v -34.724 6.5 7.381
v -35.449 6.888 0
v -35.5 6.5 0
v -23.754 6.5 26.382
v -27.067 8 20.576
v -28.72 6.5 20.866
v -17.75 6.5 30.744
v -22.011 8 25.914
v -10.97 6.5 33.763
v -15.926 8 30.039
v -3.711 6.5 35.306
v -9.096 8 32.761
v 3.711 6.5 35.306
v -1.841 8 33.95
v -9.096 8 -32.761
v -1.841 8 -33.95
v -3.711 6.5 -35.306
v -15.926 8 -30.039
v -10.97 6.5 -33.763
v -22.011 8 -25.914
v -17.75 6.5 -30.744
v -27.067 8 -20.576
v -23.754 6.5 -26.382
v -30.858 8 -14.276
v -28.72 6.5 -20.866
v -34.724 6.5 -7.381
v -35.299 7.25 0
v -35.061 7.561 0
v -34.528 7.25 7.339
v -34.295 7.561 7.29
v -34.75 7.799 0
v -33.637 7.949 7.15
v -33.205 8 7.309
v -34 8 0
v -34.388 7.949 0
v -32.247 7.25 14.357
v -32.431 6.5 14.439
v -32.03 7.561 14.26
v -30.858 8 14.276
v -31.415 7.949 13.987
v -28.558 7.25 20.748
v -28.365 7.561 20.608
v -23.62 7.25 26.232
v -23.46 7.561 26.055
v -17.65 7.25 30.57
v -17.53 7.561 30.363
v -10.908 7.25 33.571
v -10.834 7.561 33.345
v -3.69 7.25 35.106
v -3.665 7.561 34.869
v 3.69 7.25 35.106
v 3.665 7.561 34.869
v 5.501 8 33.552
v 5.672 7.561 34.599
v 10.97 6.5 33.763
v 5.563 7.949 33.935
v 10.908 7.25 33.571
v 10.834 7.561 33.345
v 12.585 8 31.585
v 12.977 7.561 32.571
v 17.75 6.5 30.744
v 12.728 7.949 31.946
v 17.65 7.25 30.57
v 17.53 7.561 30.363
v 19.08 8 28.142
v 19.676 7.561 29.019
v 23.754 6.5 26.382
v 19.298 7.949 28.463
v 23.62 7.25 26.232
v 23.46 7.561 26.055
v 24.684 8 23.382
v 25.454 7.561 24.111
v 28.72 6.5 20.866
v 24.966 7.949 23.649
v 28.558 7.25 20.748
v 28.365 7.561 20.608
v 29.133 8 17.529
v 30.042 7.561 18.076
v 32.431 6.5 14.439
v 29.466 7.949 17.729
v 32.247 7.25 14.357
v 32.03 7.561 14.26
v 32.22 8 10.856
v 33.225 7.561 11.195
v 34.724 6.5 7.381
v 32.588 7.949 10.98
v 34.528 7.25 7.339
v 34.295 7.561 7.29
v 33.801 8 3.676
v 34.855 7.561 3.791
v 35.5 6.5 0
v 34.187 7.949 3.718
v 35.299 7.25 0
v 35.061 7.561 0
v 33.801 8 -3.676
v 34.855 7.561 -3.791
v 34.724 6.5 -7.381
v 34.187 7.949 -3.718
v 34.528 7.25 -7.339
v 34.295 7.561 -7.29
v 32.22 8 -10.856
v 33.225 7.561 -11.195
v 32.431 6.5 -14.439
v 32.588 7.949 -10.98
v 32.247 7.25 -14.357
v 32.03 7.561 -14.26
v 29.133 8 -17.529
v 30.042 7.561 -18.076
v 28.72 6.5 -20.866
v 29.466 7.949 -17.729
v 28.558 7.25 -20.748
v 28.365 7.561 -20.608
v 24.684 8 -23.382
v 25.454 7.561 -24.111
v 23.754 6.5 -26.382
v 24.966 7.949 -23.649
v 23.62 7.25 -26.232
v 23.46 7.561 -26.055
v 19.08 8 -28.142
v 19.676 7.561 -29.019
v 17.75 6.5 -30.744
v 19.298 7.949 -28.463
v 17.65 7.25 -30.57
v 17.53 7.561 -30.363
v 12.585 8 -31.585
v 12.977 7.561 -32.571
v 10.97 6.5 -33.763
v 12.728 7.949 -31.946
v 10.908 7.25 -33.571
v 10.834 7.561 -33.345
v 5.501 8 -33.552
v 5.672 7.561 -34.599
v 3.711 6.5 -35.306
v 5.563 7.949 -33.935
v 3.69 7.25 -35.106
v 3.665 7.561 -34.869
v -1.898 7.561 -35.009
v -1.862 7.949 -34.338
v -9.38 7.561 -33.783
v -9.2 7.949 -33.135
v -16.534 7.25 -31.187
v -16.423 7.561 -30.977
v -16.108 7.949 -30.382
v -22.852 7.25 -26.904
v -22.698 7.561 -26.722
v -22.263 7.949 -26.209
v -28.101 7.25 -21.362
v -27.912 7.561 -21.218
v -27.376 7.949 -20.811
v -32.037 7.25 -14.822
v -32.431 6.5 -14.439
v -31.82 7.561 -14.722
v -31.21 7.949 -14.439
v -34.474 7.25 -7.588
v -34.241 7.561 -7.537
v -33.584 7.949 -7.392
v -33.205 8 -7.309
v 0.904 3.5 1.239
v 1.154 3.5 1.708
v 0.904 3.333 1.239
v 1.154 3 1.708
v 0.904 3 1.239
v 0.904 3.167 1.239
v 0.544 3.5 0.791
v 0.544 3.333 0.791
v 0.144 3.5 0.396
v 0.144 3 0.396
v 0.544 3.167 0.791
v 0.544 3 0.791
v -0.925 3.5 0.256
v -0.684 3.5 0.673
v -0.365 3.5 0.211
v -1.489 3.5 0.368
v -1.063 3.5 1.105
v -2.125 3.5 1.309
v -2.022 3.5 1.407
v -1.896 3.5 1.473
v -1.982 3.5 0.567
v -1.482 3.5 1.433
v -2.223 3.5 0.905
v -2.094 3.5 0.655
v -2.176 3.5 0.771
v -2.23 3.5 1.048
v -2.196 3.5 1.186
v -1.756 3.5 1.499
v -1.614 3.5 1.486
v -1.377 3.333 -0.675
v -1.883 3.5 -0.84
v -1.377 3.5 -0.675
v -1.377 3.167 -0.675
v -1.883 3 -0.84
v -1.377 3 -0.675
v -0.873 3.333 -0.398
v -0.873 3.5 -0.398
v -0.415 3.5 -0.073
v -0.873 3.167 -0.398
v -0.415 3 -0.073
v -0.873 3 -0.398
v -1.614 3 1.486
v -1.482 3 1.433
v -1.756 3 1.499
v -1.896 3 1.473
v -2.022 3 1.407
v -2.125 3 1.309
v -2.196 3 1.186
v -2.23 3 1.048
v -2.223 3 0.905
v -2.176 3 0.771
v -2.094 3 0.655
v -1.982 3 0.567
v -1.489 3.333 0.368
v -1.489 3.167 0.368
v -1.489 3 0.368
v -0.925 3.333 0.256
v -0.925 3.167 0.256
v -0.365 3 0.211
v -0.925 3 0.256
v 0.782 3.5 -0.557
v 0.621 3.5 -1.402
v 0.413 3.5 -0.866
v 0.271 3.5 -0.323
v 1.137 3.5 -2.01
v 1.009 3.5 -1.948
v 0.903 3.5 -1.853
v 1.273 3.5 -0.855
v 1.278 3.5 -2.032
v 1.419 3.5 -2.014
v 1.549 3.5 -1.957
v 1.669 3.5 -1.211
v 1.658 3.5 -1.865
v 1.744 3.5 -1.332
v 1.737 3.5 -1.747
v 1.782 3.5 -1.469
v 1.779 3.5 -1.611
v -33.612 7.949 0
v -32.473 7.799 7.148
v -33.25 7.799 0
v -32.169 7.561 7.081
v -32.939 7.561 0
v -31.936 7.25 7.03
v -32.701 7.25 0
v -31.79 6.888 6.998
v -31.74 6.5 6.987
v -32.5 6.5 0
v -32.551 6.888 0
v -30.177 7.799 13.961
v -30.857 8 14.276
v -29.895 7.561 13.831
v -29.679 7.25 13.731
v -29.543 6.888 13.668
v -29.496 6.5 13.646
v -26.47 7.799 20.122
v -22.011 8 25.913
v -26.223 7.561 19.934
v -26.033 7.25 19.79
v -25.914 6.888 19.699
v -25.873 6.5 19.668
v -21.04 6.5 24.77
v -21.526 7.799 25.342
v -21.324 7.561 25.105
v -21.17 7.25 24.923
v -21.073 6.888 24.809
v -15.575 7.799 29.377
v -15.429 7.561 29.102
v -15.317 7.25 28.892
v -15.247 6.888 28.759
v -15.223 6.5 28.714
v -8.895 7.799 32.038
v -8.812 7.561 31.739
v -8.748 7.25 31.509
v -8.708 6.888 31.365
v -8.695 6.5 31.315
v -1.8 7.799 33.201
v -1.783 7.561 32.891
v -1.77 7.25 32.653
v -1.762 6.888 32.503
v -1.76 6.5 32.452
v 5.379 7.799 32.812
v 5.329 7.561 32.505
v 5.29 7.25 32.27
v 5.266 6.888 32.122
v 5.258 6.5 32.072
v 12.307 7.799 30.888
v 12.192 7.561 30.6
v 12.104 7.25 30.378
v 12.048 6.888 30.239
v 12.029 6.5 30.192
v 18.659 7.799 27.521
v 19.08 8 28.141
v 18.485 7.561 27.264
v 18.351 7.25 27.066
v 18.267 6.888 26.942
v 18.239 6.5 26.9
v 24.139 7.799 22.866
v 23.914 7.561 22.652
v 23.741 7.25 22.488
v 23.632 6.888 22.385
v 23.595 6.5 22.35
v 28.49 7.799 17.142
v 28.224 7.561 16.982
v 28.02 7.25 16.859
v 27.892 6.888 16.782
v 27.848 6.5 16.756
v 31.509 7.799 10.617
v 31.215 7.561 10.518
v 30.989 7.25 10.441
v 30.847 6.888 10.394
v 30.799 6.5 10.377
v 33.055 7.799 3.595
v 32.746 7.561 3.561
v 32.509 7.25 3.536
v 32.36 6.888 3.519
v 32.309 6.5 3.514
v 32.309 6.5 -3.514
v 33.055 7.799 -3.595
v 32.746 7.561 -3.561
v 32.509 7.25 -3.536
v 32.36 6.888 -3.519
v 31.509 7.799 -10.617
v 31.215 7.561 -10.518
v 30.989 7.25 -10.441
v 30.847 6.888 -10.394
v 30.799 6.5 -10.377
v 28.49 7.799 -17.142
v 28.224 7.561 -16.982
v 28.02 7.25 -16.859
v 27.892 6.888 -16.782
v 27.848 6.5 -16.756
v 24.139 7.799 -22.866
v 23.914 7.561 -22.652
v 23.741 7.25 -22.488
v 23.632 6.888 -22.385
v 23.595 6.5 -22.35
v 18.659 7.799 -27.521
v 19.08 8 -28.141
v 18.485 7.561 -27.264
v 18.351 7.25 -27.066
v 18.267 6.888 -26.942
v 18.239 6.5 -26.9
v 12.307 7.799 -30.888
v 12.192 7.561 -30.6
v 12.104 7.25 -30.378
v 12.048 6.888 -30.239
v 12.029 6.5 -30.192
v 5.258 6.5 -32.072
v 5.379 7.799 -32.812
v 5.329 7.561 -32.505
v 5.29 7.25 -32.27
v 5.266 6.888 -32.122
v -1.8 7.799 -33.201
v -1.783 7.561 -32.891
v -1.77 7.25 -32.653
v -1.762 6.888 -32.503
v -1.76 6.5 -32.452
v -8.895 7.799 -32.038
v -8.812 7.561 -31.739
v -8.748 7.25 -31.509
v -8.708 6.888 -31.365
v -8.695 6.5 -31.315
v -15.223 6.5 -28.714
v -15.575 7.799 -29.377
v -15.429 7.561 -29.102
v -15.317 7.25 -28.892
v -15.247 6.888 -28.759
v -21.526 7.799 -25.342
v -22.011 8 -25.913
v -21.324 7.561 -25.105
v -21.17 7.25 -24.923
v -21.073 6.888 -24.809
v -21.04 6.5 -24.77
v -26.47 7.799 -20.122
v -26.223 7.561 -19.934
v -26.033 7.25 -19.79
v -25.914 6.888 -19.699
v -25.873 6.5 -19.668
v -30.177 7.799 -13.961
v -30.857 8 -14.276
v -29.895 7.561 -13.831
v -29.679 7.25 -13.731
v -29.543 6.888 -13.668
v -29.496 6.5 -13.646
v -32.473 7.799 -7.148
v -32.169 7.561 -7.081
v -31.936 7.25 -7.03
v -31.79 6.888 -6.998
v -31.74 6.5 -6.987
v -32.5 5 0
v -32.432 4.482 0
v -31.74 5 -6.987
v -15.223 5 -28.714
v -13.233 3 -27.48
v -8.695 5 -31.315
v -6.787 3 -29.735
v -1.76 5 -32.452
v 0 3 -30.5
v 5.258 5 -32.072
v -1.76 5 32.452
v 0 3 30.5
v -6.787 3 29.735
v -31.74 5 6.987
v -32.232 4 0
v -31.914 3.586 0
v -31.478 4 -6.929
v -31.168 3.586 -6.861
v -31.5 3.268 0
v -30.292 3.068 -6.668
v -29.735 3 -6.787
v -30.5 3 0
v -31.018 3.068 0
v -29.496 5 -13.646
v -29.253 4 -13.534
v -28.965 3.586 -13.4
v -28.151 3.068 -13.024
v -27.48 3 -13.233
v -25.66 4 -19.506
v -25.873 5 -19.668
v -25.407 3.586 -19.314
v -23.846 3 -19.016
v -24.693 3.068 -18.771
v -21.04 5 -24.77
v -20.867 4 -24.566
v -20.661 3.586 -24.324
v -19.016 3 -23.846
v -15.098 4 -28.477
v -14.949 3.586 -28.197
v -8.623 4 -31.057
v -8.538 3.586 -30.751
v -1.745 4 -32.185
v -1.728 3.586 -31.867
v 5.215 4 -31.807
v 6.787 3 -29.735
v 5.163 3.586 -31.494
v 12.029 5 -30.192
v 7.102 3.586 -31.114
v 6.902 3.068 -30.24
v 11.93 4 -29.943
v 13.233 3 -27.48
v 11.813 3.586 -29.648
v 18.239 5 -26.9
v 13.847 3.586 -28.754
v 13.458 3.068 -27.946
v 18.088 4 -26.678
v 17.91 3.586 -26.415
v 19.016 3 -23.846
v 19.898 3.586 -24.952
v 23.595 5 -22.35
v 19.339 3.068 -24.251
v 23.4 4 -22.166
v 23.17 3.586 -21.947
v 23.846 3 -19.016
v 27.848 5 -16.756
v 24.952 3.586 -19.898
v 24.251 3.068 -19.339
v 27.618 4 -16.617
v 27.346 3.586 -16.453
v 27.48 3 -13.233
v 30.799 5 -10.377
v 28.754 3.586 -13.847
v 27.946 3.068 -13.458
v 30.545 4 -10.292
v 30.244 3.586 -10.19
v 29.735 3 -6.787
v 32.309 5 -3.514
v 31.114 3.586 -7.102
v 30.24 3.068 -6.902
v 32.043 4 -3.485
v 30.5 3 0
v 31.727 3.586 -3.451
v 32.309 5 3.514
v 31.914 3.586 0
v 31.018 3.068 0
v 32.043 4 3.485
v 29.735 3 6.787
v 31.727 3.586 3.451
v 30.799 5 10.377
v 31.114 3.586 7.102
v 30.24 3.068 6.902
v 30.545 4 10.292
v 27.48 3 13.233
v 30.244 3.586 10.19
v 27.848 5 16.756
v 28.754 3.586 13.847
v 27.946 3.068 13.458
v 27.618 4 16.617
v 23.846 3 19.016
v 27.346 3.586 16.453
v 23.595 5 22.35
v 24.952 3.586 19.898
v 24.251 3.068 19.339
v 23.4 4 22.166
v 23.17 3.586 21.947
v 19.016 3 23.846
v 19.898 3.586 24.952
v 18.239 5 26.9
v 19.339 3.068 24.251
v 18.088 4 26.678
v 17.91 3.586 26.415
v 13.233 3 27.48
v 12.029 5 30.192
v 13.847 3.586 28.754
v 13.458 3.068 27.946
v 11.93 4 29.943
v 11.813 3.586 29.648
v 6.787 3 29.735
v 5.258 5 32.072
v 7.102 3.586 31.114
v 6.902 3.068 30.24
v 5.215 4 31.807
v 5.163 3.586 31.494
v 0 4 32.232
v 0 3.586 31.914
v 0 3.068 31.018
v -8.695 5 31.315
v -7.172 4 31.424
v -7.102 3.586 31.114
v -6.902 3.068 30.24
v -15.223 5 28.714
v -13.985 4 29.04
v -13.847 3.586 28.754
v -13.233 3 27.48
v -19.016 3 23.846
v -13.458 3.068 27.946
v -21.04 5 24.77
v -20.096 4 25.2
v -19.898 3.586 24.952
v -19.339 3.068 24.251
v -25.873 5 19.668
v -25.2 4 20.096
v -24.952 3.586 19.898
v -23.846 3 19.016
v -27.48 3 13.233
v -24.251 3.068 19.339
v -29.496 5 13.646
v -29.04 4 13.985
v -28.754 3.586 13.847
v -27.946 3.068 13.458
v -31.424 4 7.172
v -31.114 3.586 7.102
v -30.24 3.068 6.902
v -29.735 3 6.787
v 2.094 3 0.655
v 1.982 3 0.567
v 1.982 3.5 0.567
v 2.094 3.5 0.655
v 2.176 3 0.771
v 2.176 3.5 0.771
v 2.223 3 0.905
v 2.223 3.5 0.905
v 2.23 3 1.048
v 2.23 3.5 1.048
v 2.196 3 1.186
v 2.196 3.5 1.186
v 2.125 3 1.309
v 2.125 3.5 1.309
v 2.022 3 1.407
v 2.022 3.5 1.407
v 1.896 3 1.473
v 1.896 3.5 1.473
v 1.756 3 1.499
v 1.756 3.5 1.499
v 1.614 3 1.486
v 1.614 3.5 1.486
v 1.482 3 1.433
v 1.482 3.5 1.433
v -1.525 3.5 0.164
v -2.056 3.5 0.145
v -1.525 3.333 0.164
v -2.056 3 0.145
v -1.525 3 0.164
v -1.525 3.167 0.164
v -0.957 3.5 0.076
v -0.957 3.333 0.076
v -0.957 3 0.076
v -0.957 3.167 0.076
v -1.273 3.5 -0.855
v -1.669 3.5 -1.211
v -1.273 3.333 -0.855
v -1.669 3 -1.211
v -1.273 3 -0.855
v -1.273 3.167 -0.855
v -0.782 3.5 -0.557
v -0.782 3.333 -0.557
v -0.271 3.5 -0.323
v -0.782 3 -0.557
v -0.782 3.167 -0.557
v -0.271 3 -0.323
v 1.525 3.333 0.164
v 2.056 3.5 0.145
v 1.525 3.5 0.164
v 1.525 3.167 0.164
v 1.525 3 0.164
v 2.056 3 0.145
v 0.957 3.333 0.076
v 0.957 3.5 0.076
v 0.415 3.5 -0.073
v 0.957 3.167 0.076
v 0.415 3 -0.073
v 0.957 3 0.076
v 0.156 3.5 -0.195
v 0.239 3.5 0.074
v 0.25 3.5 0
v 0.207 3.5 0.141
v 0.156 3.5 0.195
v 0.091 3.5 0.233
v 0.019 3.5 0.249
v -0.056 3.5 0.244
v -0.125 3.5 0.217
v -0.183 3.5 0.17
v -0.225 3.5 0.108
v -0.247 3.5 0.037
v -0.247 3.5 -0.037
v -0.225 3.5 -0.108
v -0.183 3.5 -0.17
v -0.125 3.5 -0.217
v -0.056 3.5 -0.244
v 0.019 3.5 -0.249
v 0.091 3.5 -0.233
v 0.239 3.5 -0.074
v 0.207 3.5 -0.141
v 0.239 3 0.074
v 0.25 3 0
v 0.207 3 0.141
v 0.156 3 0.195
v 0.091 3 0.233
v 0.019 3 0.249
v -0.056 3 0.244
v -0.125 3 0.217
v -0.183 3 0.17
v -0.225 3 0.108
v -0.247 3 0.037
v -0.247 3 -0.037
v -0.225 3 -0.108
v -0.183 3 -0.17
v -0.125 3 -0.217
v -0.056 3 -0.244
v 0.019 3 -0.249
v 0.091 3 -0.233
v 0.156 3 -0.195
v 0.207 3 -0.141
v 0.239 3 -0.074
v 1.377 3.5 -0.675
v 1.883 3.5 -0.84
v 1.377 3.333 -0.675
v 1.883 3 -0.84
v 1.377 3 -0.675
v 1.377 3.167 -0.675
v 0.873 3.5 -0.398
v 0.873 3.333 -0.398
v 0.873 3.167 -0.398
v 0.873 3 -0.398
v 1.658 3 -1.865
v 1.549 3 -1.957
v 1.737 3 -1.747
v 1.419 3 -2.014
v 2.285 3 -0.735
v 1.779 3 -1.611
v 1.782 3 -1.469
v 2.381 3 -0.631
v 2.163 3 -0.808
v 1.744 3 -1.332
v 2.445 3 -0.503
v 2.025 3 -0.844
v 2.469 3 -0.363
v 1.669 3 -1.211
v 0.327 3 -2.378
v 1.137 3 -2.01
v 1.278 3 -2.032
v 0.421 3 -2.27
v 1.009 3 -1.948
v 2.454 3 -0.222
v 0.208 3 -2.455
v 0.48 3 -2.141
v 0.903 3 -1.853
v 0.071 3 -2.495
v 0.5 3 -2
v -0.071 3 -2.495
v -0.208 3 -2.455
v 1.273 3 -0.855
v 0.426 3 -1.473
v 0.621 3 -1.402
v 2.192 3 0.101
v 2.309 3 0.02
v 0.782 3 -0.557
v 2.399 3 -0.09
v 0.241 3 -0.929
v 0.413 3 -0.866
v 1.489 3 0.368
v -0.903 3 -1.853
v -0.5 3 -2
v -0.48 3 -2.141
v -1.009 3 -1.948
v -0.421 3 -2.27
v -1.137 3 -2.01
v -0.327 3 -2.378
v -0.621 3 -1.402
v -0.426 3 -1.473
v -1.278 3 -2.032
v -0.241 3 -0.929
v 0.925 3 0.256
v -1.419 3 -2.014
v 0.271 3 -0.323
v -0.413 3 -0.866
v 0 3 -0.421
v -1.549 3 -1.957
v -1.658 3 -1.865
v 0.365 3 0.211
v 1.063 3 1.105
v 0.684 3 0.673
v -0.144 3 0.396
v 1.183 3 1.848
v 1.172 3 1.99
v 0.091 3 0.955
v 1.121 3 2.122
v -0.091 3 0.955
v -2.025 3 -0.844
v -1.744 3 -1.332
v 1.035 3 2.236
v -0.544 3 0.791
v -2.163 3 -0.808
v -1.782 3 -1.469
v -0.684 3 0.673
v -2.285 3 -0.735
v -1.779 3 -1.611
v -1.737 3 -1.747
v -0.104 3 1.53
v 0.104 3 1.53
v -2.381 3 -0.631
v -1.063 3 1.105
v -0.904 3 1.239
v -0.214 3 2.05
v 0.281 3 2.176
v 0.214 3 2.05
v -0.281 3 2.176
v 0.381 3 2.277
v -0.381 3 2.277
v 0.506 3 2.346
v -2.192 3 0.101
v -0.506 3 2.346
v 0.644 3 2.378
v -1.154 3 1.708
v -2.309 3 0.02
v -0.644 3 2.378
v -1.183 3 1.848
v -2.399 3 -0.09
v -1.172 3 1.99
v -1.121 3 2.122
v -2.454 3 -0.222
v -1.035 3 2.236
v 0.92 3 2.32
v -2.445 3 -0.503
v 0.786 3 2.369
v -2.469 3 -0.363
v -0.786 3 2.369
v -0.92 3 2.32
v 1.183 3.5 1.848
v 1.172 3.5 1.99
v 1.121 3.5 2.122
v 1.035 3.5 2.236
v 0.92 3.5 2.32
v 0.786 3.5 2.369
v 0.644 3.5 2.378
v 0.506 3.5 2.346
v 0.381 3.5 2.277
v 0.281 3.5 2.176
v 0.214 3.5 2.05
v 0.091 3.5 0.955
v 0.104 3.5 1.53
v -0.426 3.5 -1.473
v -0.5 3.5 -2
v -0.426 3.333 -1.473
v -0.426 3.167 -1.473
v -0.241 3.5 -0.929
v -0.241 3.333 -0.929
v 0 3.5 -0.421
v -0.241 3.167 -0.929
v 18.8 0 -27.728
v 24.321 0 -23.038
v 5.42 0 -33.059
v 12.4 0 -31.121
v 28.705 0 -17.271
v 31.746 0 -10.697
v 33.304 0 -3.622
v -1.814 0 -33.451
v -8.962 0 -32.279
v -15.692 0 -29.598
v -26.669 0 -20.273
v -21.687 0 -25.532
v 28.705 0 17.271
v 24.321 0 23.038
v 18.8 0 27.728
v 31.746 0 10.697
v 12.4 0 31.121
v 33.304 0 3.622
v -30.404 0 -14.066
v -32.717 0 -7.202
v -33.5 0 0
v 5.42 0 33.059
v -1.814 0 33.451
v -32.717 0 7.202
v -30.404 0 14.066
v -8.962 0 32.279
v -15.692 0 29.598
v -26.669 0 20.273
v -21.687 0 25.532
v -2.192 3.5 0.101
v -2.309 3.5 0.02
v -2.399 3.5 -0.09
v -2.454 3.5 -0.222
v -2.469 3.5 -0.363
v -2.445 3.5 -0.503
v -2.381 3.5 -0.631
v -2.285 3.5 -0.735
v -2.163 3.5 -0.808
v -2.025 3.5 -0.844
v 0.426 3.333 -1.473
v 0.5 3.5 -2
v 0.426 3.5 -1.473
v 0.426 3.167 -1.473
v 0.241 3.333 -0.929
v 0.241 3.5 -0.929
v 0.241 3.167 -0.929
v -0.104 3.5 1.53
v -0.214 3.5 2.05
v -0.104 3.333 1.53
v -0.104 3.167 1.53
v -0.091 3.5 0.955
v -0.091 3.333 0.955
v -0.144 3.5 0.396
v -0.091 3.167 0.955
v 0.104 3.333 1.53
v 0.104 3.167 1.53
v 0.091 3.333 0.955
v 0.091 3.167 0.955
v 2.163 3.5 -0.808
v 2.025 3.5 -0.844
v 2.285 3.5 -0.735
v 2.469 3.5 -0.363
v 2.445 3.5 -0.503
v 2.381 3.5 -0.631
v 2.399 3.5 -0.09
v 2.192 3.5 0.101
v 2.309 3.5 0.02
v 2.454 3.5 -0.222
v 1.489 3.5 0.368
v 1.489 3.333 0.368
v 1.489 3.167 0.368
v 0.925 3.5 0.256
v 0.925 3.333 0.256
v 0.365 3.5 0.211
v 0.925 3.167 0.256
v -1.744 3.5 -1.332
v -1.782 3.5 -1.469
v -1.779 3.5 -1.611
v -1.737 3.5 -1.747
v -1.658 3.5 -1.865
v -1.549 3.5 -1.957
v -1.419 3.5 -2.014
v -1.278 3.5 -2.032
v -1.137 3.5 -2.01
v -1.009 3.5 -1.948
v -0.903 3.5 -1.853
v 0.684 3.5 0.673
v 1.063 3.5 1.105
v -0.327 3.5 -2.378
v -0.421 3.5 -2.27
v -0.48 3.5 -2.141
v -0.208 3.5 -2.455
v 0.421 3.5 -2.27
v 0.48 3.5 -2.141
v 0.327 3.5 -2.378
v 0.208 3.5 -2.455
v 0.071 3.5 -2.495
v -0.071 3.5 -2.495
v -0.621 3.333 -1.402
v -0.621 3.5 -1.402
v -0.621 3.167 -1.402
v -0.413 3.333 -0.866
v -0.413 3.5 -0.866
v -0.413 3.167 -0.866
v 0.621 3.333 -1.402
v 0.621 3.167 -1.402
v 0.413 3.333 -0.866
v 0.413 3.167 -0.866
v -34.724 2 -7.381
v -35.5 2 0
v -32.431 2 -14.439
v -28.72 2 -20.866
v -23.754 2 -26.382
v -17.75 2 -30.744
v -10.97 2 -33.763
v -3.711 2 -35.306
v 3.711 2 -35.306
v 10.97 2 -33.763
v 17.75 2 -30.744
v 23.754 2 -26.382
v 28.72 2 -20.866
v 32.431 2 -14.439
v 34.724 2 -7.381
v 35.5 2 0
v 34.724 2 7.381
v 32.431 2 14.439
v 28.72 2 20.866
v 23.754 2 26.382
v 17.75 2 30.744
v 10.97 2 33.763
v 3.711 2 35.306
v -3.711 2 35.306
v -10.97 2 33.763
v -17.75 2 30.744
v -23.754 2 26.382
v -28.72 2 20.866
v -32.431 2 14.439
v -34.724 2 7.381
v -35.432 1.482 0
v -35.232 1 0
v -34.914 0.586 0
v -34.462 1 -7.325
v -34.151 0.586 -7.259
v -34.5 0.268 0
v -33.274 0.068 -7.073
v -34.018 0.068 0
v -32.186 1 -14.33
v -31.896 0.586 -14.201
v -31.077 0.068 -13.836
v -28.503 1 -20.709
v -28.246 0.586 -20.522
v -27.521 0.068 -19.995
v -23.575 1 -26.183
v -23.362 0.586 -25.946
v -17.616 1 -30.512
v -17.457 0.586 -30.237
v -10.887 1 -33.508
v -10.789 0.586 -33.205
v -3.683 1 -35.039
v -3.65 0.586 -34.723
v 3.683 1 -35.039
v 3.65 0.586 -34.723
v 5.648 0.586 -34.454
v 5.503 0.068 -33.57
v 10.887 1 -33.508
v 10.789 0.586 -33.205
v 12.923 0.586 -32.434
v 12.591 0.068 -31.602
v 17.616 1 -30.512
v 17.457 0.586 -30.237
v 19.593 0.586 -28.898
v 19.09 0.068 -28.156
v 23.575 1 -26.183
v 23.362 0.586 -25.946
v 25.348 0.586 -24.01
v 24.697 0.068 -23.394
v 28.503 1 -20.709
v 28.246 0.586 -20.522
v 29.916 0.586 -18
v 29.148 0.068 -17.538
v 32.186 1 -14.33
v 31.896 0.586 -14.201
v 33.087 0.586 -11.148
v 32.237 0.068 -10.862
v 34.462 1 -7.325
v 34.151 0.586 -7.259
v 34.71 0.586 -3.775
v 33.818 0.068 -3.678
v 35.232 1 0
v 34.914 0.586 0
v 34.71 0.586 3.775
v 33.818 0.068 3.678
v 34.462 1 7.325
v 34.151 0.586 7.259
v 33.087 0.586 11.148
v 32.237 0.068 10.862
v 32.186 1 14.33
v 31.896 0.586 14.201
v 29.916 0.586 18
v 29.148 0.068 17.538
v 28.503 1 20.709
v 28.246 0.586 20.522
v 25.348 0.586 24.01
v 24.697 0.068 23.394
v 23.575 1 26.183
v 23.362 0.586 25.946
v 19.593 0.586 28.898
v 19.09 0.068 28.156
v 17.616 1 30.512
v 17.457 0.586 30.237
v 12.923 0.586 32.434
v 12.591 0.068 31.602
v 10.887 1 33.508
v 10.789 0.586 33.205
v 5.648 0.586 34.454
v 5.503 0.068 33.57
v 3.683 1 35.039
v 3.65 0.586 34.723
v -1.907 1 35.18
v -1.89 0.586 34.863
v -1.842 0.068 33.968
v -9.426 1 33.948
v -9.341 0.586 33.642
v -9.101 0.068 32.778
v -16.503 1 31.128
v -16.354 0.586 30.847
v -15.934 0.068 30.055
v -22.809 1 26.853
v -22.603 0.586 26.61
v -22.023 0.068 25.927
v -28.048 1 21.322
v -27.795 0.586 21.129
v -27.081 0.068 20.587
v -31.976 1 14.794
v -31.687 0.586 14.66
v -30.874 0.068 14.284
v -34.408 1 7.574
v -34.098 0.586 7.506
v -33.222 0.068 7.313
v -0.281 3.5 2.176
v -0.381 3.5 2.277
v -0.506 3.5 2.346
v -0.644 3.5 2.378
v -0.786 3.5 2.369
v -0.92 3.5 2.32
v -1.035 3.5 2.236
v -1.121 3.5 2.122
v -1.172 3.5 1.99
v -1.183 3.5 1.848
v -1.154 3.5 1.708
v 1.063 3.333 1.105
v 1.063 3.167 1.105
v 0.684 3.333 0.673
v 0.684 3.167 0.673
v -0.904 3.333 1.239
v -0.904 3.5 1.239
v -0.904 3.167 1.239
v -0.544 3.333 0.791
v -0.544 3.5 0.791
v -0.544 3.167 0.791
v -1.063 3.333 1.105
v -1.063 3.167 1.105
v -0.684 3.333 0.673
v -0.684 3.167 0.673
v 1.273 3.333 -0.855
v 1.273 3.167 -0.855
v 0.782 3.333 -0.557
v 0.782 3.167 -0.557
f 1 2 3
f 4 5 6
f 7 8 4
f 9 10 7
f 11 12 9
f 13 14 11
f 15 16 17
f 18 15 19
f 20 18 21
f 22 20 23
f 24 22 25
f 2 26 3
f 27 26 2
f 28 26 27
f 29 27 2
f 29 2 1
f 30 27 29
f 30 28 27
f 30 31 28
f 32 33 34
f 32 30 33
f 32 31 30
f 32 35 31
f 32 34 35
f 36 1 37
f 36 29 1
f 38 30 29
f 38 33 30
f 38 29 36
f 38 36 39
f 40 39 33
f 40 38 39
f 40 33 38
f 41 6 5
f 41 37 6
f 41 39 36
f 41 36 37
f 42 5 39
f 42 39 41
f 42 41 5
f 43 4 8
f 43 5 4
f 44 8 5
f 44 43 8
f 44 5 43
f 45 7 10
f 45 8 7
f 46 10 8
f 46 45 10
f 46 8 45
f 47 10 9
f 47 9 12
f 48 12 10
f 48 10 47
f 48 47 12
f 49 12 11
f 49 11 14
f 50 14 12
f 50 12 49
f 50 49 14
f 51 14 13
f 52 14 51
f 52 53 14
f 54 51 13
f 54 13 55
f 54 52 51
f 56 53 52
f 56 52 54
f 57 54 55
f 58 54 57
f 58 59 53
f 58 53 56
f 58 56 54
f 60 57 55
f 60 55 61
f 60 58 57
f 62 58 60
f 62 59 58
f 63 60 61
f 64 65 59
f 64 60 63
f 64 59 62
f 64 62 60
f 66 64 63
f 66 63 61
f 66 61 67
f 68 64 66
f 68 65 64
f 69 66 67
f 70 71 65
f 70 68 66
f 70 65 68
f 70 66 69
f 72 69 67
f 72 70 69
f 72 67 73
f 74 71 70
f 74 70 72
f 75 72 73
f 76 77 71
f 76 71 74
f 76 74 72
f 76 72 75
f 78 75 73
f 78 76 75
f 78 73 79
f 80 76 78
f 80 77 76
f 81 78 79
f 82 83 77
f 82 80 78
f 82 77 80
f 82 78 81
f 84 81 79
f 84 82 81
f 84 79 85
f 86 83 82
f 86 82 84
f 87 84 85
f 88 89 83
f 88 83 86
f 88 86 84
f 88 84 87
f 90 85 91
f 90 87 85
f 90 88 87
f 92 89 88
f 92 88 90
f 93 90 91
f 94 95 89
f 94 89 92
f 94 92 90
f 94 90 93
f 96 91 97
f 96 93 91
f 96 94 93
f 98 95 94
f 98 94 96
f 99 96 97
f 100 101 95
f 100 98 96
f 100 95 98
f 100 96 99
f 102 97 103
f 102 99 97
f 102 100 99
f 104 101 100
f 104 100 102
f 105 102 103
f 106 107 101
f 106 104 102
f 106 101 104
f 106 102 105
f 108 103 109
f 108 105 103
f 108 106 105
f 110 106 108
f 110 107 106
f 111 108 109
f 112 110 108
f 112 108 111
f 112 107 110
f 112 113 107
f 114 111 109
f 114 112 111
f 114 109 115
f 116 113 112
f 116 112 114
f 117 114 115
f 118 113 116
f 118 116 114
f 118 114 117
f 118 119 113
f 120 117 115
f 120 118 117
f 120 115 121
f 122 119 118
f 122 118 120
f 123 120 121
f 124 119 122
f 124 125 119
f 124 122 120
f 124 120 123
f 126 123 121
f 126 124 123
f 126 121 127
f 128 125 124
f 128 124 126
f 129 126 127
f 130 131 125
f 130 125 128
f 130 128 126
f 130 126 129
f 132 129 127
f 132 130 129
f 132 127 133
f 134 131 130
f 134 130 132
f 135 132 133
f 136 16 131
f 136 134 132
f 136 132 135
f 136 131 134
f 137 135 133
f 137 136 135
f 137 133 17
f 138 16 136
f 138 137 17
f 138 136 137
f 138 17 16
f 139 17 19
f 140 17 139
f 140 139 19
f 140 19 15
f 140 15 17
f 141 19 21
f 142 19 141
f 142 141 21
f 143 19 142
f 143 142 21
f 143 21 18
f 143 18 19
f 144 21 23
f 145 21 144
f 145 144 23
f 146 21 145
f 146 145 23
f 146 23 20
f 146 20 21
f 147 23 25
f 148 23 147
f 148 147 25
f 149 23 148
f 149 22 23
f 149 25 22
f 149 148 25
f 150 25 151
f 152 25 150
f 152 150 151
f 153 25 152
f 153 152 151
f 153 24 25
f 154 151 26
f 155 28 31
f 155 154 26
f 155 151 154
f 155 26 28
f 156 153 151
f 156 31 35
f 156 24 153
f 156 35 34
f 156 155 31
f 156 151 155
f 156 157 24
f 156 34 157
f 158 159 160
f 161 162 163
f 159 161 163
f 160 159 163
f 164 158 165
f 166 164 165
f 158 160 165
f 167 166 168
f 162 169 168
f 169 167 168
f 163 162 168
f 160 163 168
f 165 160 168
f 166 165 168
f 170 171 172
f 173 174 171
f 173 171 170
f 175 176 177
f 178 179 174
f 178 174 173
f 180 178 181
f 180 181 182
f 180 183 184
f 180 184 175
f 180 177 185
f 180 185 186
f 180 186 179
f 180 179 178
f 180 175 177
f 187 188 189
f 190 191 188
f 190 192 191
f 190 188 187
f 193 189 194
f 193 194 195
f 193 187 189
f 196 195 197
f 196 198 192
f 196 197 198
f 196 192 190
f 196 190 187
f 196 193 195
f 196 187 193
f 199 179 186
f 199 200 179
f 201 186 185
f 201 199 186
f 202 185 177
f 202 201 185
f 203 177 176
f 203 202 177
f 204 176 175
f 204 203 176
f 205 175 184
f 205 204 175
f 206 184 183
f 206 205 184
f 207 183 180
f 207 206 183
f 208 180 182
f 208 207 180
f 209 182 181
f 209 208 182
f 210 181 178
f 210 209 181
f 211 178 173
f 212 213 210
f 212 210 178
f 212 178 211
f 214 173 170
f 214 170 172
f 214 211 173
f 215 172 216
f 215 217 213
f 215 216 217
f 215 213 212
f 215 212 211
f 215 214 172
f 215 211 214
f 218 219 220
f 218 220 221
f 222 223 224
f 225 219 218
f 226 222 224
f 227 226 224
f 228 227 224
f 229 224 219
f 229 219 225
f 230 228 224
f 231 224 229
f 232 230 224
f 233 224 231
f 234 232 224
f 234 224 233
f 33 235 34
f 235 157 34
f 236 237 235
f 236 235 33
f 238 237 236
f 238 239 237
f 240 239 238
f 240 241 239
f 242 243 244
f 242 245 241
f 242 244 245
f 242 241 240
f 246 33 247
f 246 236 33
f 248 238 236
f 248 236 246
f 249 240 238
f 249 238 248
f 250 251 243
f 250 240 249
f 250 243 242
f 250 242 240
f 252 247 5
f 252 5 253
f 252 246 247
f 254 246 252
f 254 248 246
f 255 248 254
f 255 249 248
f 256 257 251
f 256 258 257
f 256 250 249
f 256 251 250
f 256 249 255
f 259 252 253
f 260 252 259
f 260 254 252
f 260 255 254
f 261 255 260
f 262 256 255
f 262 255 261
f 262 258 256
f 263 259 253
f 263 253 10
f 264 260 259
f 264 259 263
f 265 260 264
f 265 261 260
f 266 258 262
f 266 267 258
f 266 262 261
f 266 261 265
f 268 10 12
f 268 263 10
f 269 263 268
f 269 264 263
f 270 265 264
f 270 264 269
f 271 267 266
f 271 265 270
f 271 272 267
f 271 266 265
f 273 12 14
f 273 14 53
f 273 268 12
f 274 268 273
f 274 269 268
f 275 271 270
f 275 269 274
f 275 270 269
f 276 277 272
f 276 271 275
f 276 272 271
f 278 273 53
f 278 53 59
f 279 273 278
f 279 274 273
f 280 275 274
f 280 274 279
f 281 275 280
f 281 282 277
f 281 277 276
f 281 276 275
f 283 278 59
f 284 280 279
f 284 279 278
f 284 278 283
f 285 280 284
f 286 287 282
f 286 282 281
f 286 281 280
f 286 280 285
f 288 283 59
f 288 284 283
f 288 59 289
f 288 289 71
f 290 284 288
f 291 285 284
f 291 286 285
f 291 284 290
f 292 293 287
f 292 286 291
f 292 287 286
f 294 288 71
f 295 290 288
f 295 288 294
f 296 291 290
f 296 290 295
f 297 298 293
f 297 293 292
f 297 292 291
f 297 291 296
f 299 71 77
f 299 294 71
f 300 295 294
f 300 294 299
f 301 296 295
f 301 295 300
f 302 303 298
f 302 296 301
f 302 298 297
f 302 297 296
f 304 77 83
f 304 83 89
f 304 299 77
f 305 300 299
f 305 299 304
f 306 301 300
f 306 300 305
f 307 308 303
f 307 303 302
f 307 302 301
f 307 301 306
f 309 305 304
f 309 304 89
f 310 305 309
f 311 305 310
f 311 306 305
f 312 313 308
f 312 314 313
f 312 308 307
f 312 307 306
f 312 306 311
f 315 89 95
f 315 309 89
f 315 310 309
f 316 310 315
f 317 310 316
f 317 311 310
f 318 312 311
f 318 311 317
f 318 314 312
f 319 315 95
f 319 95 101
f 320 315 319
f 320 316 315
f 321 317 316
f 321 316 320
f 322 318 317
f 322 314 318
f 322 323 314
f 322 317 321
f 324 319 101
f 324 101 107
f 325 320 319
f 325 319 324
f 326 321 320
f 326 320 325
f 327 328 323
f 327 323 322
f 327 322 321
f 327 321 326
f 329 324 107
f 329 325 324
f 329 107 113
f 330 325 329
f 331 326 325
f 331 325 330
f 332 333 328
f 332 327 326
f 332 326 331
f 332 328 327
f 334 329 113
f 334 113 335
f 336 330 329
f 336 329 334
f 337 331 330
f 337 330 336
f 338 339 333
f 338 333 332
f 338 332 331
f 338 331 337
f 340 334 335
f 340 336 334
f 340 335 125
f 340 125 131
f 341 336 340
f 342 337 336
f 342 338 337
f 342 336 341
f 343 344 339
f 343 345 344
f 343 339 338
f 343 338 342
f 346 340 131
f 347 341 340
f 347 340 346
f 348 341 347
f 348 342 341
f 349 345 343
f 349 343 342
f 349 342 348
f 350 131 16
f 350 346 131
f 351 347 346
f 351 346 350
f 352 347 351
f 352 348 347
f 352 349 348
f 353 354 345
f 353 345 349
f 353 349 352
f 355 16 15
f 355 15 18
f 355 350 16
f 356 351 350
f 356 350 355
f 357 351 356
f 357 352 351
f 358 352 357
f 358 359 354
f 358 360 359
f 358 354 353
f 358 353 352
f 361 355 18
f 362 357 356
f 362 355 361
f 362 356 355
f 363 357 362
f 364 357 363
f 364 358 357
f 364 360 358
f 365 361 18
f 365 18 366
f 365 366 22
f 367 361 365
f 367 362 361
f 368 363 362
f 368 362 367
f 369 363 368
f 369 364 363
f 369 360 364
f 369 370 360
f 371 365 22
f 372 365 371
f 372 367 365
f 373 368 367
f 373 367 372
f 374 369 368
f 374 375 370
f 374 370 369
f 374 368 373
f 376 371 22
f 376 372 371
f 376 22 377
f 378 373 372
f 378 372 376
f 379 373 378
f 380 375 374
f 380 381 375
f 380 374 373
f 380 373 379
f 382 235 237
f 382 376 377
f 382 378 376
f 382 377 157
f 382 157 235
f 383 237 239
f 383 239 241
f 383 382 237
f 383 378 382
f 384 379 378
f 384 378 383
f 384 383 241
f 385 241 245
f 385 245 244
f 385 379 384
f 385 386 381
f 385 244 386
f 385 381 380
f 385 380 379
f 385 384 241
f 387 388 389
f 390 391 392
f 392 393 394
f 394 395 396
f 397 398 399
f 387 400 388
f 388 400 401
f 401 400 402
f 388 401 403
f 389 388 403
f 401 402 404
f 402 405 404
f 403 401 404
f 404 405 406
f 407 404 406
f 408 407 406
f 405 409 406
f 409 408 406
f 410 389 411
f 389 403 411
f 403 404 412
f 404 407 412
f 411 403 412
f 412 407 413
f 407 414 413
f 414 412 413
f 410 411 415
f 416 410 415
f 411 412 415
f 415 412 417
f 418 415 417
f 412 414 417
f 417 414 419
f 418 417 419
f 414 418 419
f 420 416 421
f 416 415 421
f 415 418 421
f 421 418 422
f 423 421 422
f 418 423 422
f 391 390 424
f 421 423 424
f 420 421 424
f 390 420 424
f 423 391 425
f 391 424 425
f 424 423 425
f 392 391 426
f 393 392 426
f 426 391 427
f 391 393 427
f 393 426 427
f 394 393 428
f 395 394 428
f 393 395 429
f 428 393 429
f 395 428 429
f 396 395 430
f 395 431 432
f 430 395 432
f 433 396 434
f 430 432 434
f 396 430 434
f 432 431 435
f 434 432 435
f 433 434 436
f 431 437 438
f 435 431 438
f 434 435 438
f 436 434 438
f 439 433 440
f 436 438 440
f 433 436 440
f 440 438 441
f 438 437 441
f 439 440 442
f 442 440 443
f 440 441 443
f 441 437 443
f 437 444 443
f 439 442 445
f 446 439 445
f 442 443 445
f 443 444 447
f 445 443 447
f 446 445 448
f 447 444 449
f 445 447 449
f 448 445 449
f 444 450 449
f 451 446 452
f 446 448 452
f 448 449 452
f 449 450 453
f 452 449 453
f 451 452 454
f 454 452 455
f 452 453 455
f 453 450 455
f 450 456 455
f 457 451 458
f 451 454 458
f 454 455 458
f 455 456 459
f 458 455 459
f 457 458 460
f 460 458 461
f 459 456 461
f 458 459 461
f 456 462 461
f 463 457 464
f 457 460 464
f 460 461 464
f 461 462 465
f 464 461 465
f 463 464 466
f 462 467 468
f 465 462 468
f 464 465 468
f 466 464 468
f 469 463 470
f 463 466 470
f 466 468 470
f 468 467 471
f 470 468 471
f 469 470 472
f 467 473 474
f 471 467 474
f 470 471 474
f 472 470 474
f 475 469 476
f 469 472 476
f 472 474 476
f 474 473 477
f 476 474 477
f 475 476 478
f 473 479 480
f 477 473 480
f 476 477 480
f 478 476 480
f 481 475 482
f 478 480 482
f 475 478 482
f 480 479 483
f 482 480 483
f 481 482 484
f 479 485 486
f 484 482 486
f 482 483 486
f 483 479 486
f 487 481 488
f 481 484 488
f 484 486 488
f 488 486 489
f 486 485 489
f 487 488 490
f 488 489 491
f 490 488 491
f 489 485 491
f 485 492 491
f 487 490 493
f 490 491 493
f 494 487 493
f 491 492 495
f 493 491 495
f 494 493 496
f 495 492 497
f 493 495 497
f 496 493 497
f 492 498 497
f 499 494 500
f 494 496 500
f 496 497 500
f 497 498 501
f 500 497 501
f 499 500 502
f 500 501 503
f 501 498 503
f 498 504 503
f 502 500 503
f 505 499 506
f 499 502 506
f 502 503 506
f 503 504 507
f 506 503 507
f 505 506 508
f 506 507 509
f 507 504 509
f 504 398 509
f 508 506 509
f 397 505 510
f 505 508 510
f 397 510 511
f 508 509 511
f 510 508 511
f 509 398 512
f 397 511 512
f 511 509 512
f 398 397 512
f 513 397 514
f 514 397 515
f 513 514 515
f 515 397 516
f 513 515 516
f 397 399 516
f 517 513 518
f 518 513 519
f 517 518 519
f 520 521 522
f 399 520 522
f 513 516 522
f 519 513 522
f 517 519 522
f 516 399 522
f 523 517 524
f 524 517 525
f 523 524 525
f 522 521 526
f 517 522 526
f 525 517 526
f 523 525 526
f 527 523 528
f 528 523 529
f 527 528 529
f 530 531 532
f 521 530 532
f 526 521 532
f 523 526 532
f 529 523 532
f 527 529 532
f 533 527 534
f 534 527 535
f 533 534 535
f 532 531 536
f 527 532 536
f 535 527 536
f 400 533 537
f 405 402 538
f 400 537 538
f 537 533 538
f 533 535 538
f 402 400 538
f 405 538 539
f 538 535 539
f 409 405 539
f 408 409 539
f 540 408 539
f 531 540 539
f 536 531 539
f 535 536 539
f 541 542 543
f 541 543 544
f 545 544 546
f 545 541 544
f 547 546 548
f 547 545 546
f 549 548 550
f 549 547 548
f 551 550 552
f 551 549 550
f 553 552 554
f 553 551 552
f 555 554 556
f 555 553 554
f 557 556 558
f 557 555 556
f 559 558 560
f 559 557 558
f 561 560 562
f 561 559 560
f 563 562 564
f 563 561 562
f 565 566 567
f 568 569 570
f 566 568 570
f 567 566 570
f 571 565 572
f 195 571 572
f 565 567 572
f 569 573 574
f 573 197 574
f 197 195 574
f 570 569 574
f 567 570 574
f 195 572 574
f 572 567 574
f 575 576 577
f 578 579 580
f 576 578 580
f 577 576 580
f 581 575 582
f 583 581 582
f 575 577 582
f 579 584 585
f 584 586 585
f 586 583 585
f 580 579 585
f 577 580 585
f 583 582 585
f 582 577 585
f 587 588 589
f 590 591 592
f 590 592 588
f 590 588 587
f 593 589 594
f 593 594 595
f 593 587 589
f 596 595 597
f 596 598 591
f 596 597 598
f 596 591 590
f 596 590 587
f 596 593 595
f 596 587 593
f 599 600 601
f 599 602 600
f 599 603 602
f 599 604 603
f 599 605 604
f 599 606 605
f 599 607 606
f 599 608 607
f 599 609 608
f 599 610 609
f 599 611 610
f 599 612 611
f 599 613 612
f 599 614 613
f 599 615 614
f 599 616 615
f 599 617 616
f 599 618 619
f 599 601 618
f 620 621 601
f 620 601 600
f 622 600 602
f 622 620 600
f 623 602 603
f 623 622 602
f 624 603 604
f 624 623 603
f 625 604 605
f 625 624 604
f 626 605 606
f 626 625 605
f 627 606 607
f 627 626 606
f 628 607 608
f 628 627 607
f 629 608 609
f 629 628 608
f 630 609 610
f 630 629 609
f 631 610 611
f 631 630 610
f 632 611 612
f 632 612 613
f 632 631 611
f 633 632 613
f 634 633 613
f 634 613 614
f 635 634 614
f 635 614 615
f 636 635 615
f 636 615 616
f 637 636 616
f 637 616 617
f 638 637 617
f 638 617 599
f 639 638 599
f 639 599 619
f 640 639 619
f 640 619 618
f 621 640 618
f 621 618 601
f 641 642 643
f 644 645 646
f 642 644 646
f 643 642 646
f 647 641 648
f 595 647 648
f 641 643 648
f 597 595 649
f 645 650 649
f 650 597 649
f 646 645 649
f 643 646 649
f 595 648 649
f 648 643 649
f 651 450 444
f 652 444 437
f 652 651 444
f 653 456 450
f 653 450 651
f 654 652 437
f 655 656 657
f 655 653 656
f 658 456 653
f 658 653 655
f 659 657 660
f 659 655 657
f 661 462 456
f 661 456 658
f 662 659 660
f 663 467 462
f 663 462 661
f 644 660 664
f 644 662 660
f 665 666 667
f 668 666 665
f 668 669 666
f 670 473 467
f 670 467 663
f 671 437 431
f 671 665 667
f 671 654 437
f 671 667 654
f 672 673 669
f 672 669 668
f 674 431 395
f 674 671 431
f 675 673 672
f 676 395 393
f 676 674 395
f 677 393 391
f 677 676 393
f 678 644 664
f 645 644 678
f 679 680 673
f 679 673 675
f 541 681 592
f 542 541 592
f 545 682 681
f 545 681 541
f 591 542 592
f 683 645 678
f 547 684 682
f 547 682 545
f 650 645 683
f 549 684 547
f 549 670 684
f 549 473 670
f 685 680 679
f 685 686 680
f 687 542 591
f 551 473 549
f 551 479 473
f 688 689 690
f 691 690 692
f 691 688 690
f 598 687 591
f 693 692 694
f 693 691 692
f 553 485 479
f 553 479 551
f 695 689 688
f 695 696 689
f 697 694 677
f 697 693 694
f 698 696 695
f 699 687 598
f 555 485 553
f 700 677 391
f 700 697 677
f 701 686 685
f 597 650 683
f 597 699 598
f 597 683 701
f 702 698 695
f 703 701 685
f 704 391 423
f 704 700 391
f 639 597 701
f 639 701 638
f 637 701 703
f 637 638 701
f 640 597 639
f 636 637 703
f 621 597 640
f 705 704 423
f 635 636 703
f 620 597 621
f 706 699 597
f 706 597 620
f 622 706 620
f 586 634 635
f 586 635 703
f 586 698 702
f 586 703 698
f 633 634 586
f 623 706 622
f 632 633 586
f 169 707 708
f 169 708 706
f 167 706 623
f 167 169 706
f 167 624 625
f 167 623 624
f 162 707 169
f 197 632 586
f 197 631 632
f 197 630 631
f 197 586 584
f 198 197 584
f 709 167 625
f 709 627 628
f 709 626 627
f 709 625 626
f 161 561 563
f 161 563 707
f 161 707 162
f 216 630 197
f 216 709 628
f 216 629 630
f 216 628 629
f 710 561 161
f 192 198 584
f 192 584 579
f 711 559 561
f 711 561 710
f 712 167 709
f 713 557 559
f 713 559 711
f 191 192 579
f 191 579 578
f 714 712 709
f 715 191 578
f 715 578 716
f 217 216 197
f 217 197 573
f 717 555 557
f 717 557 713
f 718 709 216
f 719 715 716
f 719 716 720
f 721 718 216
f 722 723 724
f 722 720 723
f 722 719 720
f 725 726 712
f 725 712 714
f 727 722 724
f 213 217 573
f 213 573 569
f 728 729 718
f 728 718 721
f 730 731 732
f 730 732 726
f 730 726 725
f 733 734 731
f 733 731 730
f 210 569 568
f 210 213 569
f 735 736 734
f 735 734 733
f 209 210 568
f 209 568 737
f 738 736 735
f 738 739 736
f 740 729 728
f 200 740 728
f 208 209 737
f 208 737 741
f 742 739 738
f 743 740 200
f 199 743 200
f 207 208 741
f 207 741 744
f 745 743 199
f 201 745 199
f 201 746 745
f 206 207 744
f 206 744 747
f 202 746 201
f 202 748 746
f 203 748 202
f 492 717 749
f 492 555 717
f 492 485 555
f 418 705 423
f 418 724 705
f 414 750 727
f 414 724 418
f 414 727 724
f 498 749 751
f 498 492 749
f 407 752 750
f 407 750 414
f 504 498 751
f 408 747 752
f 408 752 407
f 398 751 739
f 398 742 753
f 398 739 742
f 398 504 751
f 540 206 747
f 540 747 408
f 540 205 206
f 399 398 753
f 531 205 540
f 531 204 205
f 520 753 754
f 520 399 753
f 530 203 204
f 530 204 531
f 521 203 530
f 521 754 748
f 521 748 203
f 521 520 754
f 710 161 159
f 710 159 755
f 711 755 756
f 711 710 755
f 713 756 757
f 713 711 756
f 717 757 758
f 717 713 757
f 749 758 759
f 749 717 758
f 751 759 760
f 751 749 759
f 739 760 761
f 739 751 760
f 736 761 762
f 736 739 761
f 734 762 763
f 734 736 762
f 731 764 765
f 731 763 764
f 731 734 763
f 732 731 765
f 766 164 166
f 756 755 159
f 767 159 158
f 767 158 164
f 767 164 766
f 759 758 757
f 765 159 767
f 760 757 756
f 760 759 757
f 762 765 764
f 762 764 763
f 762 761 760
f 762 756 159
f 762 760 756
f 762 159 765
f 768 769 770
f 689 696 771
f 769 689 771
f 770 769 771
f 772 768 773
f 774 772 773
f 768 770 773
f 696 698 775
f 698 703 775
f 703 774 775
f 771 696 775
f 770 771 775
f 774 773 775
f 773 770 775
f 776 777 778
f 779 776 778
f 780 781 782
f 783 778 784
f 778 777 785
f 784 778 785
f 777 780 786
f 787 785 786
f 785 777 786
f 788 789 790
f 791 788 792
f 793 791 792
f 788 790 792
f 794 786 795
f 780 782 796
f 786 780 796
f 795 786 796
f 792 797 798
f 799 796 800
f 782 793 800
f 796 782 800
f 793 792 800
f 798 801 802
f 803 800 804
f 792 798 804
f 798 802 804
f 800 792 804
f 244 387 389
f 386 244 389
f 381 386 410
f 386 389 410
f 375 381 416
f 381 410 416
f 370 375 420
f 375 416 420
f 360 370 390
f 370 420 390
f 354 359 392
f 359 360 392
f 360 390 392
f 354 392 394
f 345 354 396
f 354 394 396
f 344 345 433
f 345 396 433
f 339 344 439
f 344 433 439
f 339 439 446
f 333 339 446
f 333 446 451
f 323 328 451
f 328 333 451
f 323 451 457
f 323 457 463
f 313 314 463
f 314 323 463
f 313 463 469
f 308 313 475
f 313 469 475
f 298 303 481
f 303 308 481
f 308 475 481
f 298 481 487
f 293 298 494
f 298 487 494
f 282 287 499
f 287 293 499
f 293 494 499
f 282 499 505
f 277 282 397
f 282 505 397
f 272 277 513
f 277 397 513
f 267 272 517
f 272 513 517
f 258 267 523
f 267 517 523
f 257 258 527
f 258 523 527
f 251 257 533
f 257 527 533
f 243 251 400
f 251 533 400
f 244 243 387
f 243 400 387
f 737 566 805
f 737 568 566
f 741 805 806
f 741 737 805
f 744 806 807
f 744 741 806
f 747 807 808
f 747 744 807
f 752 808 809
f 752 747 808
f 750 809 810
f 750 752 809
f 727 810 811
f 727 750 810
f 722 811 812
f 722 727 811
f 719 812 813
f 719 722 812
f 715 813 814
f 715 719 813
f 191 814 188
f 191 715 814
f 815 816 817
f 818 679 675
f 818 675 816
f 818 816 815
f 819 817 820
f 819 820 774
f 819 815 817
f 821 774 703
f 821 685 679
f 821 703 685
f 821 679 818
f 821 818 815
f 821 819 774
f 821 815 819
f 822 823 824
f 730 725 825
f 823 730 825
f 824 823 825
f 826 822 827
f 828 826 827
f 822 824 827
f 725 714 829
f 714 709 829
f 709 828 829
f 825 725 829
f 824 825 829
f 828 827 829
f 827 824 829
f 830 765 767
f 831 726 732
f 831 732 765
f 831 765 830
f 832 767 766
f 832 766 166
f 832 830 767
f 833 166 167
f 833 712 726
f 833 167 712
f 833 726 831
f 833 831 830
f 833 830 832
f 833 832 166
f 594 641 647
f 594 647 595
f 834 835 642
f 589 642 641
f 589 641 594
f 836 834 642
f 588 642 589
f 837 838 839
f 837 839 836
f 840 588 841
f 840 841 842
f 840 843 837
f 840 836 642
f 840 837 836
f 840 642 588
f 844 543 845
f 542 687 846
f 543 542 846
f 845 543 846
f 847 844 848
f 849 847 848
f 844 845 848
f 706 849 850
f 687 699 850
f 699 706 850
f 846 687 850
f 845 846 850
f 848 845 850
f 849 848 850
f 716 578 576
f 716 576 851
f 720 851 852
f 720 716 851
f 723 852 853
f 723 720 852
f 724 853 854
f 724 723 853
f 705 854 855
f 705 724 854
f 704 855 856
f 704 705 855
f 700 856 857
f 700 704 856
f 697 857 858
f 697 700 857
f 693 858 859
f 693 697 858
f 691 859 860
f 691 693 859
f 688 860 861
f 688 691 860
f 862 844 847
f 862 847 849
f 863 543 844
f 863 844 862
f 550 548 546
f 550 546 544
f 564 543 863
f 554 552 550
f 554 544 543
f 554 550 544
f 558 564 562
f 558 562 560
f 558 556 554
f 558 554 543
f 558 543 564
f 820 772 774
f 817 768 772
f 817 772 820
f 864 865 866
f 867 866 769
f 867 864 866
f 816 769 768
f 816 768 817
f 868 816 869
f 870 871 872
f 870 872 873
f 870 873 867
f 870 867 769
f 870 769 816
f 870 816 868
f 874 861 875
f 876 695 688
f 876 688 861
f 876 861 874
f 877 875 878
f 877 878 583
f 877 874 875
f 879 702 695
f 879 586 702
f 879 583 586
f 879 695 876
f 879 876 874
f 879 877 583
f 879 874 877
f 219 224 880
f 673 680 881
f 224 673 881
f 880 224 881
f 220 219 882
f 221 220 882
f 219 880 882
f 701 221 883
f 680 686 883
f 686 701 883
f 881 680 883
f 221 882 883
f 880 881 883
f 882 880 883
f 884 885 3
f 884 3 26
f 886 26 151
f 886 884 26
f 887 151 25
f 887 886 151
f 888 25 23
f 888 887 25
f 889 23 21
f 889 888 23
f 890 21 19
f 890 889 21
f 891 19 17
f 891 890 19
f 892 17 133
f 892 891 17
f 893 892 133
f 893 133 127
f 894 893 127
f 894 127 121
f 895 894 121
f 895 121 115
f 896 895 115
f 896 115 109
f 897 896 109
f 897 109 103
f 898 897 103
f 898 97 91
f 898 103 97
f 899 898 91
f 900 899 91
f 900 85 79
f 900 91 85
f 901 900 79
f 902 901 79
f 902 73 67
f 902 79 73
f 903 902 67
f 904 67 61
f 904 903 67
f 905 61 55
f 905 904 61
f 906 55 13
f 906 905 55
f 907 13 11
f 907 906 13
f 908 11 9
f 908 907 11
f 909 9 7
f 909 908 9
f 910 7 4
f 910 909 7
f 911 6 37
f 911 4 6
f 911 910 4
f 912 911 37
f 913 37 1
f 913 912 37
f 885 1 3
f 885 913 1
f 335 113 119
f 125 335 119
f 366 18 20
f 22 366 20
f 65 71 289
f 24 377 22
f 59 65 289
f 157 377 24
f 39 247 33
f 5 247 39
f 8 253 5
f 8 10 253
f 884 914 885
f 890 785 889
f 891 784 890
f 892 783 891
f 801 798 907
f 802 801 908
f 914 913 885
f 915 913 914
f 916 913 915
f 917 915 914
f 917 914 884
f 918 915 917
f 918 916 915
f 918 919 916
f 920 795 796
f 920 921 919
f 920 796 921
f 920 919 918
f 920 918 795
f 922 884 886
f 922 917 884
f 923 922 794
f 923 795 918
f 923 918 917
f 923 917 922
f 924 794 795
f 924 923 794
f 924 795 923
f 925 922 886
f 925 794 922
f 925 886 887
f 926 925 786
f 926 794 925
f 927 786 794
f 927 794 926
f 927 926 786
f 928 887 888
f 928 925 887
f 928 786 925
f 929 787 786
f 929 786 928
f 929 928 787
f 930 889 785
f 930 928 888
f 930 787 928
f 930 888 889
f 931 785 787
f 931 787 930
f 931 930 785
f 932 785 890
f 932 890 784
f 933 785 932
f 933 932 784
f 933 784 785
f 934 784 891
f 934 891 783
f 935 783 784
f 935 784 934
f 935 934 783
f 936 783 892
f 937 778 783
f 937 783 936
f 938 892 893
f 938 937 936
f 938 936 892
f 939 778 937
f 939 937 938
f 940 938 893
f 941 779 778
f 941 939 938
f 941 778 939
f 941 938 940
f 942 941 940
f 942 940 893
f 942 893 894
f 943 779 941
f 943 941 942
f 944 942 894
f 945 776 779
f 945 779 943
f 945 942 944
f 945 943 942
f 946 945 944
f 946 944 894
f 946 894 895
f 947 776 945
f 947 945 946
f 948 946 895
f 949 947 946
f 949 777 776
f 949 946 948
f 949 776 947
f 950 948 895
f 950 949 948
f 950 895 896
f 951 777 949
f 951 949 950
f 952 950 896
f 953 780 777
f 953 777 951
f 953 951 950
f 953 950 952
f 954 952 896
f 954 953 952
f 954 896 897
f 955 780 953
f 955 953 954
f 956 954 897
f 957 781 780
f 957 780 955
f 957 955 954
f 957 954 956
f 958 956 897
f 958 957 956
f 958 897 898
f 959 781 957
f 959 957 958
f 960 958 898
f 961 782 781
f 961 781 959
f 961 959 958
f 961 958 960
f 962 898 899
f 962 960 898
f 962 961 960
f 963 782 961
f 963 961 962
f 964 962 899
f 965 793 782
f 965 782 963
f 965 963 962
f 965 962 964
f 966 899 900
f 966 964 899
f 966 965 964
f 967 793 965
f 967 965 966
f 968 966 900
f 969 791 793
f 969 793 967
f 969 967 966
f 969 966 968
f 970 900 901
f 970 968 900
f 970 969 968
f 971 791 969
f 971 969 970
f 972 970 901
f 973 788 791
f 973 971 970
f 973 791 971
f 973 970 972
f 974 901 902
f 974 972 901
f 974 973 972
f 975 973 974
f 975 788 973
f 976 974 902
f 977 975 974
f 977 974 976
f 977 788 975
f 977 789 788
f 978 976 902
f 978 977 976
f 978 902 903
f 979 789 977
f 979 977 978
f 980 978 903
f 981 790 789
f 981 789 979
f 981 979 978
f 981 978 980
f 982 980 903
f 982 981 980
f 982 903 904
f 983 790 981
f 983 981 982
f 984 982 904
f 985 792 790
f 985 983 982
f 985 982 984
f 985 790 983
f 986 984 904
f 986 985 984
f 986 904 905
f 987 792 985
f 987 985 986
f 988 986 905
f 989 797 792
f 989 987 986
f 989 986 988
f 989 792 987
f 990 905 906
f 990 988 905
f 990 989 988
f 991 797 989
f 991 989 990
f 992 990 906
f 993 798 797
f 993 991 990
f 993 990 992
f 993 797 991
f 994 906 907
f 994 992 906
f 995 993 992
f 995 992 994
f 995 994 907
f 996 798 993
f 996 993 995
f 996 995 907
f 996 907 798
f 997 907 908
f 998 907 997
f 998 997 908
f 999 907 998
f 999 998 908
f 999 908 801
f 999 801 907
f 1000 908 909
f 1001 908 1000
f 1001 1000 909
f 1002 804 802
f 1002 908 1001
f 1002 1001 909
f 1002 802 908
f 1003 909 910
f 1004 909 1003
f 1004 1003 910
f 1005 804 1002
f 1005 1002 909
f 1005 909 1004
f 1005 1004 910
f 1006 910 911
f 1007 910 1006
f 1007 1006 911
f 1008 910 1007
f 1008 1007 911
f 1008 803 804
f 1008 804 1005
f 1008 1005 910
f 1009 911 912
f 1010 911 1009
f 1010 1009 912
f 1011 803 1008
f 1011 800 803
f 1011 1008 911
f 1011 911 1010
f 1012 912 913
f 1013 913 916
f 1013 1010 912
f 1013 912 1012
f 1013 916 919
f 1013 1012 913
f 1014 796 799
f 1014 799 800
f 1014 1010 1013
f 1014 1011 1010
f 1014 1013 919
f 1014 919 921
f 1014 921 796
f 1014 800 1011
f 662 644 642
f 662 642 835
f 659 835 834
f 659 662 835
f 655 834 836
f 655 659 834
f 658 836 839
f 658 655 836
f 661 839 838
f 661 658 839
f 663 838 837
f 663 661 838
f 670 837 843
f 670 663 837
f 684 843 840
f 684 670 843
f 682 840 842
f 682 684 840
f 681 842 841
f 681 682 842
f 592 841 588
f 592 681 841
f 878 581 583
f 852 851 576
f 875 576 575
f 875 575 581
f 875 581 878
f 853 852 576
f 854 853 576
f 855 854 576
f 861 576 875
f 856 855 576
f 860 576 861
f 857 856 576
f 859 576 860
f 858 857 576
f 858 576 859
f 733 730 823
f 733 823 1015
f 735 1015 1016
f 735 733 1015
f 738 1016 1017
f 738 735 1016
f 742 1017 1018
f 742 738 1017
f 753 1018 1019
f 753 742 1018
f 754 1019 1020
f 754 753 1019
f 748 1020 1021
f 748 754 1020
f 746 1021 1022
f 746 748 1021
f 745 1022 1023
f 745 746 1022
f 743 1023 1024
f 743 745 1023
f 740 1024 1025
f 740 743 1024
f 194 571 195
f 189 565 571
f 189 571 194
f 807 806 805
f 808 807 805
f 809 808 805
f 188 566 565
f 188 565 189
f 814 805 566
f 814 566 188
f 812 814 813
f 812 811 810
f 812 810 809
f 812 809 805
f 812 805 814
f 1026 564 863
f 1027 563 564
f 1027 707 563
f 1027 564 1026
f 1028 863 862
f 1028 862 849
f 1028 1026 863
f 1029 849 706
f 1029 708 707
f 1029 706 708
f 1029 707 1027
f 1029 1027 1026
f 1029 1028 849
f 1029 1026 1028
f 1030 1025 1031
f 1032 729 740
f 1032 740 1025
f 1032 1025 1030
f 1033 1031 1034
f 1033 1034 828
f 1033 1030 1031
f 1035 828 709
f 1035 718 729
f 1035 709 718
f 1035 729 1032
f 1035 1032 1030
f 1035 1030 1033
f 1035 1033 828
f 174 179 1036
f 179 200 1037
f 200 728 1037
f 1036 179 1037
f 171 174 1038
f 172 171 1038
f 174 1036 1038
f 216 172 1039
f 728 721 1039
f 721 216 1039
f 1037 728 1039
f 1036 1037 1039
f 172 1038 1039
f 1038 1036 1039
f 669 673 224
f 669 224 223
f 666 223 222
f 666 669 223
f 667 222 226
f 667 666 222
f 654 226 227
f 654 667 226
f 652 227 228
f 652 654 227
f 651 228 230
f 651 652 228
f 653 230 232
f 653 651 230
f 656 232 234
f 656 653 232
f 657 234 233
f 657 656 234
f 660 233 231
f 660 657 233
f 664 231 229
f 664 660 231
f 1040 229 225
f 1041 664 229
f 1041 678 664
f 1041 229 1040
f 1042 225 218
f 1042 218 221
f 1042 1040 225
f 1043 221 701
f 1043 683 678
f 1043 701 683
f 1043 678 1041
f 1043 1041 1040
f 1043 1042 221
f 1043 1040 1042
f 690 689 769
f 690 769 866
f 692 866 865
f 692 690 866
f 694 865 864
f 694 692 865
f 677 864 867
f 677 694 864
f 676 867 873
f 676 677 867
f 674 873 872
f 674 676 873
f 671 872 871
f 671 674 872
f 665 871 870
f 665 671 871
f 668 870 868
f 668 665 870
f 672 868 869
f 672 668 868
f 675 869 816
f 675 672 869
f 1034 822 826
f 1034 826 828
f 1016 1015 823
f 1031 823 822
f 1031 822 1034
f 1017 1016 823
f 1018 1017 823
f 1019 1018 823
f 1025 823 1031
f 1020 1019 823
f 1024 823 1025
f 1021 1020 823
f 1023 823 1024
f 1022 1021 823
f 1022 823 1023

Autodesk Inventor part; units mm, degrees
ref_plane "YZ Plane" through (0, 0, 0) normal (1, 0, 0) x (0, 1, 0)
ref_plane "XZ Plane" through (0, 0, 0) normal (0, 1, 0) x (-1, 0, 0)
ref_plane "XY Plane" through (0, 0, 0) normal (0, 0, 1) x (1, 0, 0)
sketch "Sketch1" plane through (0, 0, 0) normal (0, 1, 0) x (-1, 0, 0)
  circle A0 centre (0, 0) radius 32.5
  circle A1 centre (0, 0) radius 35.5
  dimension "d0" = 65
  dimension "d1" = 71
extrude "Extrusion1" add sketch "Sketch1" along normal blind 8
extrude "Extrusion2" add sketch "Sketch1" along normal blind 3 contours A0
fillet "Fillet1" radius 2 2 edges at (35.5, 0, 0) (32.5, 3, 0)
fillet "Fillet2" radius 1.5 2 edges at (32.5, 8, 0) (35.5, 8, 0)
sketch "Sketch2" plane through (0, 3, 0) normal (0, 1, 0) x (1, 0, 0)
  circle A0 centre (0, 0) radius 0.25
  circle A1 centre (0, 0) radius 2.5
  circle A2 centre (0, 2) radius 0.5
  line L0 (-0.5, 2) -> (-0.5, 1.5) construction
  line L1 (-0.5, 1.5) -> (-0.25, 0.892563) construction
  line L2 (-0.25, 0.892563) -> (0, 0.421283) construction
  spline S0 degree 3 poles (-0.5, 2) (-0.5, 1.5) (-0.25, 0.892563) (0, 0.421283) knots 1 1 1 1 2 2 2 2
  line L3 (-0.5, 1.5) -> (0.5, 1.5)
  line L4 (-0.25, 0.892563) -> (0.25, 0.892563)
  line L5 (0.5, 2) -> (0.5, 1.5) construction
  line L6 (0.5, 1.5) -> (0.25, 0.892563) construction
  line L7 (0.25, 0.892563) -> (0, 0.421283) construction
  spline S1 degree 3 poles (0.5, 2) (0.5, 1.5) (0.25, 0.892563) (0, 0.421283) knots 1 1 1 1 2 2 2 2
  dimension "d12" = 0.5
  dimension "d13" = 5
sketch "Sketch2 outline for Extrusion4" plane through (0, 3, 0) normal (0, 1, 0) x (1, 0, 0)
  circle A0 centre (0, 0) radius 0.25
  spline S0 degree 3 poles (0.5, 2) (0.5, 1.5) (0.25, 0.892563) (0, 0.421283) knots 0 0 0 0 1 1 1 1
  spline S1 degree 3 poles (-0.5, 2) (-0.5, 1.5) (-0.25, 0.892563) (0, 0.421283) knots 0 0 0 0 1 1 1 1
  arc A1 (0.5, 2) -> (-0.5, 2) centre (0, 2) ccw
extrude "Extrusion4" add sketch "Sketch2 outline for Extrusion4" along normal blind 0.5
pattern_circular "Circular Pattern1" count 9 over 360 about axis through (0, -10, 0) along (0, 1, 0) of "Extrusion4"
properties part number "Orchid Coaster V5"
